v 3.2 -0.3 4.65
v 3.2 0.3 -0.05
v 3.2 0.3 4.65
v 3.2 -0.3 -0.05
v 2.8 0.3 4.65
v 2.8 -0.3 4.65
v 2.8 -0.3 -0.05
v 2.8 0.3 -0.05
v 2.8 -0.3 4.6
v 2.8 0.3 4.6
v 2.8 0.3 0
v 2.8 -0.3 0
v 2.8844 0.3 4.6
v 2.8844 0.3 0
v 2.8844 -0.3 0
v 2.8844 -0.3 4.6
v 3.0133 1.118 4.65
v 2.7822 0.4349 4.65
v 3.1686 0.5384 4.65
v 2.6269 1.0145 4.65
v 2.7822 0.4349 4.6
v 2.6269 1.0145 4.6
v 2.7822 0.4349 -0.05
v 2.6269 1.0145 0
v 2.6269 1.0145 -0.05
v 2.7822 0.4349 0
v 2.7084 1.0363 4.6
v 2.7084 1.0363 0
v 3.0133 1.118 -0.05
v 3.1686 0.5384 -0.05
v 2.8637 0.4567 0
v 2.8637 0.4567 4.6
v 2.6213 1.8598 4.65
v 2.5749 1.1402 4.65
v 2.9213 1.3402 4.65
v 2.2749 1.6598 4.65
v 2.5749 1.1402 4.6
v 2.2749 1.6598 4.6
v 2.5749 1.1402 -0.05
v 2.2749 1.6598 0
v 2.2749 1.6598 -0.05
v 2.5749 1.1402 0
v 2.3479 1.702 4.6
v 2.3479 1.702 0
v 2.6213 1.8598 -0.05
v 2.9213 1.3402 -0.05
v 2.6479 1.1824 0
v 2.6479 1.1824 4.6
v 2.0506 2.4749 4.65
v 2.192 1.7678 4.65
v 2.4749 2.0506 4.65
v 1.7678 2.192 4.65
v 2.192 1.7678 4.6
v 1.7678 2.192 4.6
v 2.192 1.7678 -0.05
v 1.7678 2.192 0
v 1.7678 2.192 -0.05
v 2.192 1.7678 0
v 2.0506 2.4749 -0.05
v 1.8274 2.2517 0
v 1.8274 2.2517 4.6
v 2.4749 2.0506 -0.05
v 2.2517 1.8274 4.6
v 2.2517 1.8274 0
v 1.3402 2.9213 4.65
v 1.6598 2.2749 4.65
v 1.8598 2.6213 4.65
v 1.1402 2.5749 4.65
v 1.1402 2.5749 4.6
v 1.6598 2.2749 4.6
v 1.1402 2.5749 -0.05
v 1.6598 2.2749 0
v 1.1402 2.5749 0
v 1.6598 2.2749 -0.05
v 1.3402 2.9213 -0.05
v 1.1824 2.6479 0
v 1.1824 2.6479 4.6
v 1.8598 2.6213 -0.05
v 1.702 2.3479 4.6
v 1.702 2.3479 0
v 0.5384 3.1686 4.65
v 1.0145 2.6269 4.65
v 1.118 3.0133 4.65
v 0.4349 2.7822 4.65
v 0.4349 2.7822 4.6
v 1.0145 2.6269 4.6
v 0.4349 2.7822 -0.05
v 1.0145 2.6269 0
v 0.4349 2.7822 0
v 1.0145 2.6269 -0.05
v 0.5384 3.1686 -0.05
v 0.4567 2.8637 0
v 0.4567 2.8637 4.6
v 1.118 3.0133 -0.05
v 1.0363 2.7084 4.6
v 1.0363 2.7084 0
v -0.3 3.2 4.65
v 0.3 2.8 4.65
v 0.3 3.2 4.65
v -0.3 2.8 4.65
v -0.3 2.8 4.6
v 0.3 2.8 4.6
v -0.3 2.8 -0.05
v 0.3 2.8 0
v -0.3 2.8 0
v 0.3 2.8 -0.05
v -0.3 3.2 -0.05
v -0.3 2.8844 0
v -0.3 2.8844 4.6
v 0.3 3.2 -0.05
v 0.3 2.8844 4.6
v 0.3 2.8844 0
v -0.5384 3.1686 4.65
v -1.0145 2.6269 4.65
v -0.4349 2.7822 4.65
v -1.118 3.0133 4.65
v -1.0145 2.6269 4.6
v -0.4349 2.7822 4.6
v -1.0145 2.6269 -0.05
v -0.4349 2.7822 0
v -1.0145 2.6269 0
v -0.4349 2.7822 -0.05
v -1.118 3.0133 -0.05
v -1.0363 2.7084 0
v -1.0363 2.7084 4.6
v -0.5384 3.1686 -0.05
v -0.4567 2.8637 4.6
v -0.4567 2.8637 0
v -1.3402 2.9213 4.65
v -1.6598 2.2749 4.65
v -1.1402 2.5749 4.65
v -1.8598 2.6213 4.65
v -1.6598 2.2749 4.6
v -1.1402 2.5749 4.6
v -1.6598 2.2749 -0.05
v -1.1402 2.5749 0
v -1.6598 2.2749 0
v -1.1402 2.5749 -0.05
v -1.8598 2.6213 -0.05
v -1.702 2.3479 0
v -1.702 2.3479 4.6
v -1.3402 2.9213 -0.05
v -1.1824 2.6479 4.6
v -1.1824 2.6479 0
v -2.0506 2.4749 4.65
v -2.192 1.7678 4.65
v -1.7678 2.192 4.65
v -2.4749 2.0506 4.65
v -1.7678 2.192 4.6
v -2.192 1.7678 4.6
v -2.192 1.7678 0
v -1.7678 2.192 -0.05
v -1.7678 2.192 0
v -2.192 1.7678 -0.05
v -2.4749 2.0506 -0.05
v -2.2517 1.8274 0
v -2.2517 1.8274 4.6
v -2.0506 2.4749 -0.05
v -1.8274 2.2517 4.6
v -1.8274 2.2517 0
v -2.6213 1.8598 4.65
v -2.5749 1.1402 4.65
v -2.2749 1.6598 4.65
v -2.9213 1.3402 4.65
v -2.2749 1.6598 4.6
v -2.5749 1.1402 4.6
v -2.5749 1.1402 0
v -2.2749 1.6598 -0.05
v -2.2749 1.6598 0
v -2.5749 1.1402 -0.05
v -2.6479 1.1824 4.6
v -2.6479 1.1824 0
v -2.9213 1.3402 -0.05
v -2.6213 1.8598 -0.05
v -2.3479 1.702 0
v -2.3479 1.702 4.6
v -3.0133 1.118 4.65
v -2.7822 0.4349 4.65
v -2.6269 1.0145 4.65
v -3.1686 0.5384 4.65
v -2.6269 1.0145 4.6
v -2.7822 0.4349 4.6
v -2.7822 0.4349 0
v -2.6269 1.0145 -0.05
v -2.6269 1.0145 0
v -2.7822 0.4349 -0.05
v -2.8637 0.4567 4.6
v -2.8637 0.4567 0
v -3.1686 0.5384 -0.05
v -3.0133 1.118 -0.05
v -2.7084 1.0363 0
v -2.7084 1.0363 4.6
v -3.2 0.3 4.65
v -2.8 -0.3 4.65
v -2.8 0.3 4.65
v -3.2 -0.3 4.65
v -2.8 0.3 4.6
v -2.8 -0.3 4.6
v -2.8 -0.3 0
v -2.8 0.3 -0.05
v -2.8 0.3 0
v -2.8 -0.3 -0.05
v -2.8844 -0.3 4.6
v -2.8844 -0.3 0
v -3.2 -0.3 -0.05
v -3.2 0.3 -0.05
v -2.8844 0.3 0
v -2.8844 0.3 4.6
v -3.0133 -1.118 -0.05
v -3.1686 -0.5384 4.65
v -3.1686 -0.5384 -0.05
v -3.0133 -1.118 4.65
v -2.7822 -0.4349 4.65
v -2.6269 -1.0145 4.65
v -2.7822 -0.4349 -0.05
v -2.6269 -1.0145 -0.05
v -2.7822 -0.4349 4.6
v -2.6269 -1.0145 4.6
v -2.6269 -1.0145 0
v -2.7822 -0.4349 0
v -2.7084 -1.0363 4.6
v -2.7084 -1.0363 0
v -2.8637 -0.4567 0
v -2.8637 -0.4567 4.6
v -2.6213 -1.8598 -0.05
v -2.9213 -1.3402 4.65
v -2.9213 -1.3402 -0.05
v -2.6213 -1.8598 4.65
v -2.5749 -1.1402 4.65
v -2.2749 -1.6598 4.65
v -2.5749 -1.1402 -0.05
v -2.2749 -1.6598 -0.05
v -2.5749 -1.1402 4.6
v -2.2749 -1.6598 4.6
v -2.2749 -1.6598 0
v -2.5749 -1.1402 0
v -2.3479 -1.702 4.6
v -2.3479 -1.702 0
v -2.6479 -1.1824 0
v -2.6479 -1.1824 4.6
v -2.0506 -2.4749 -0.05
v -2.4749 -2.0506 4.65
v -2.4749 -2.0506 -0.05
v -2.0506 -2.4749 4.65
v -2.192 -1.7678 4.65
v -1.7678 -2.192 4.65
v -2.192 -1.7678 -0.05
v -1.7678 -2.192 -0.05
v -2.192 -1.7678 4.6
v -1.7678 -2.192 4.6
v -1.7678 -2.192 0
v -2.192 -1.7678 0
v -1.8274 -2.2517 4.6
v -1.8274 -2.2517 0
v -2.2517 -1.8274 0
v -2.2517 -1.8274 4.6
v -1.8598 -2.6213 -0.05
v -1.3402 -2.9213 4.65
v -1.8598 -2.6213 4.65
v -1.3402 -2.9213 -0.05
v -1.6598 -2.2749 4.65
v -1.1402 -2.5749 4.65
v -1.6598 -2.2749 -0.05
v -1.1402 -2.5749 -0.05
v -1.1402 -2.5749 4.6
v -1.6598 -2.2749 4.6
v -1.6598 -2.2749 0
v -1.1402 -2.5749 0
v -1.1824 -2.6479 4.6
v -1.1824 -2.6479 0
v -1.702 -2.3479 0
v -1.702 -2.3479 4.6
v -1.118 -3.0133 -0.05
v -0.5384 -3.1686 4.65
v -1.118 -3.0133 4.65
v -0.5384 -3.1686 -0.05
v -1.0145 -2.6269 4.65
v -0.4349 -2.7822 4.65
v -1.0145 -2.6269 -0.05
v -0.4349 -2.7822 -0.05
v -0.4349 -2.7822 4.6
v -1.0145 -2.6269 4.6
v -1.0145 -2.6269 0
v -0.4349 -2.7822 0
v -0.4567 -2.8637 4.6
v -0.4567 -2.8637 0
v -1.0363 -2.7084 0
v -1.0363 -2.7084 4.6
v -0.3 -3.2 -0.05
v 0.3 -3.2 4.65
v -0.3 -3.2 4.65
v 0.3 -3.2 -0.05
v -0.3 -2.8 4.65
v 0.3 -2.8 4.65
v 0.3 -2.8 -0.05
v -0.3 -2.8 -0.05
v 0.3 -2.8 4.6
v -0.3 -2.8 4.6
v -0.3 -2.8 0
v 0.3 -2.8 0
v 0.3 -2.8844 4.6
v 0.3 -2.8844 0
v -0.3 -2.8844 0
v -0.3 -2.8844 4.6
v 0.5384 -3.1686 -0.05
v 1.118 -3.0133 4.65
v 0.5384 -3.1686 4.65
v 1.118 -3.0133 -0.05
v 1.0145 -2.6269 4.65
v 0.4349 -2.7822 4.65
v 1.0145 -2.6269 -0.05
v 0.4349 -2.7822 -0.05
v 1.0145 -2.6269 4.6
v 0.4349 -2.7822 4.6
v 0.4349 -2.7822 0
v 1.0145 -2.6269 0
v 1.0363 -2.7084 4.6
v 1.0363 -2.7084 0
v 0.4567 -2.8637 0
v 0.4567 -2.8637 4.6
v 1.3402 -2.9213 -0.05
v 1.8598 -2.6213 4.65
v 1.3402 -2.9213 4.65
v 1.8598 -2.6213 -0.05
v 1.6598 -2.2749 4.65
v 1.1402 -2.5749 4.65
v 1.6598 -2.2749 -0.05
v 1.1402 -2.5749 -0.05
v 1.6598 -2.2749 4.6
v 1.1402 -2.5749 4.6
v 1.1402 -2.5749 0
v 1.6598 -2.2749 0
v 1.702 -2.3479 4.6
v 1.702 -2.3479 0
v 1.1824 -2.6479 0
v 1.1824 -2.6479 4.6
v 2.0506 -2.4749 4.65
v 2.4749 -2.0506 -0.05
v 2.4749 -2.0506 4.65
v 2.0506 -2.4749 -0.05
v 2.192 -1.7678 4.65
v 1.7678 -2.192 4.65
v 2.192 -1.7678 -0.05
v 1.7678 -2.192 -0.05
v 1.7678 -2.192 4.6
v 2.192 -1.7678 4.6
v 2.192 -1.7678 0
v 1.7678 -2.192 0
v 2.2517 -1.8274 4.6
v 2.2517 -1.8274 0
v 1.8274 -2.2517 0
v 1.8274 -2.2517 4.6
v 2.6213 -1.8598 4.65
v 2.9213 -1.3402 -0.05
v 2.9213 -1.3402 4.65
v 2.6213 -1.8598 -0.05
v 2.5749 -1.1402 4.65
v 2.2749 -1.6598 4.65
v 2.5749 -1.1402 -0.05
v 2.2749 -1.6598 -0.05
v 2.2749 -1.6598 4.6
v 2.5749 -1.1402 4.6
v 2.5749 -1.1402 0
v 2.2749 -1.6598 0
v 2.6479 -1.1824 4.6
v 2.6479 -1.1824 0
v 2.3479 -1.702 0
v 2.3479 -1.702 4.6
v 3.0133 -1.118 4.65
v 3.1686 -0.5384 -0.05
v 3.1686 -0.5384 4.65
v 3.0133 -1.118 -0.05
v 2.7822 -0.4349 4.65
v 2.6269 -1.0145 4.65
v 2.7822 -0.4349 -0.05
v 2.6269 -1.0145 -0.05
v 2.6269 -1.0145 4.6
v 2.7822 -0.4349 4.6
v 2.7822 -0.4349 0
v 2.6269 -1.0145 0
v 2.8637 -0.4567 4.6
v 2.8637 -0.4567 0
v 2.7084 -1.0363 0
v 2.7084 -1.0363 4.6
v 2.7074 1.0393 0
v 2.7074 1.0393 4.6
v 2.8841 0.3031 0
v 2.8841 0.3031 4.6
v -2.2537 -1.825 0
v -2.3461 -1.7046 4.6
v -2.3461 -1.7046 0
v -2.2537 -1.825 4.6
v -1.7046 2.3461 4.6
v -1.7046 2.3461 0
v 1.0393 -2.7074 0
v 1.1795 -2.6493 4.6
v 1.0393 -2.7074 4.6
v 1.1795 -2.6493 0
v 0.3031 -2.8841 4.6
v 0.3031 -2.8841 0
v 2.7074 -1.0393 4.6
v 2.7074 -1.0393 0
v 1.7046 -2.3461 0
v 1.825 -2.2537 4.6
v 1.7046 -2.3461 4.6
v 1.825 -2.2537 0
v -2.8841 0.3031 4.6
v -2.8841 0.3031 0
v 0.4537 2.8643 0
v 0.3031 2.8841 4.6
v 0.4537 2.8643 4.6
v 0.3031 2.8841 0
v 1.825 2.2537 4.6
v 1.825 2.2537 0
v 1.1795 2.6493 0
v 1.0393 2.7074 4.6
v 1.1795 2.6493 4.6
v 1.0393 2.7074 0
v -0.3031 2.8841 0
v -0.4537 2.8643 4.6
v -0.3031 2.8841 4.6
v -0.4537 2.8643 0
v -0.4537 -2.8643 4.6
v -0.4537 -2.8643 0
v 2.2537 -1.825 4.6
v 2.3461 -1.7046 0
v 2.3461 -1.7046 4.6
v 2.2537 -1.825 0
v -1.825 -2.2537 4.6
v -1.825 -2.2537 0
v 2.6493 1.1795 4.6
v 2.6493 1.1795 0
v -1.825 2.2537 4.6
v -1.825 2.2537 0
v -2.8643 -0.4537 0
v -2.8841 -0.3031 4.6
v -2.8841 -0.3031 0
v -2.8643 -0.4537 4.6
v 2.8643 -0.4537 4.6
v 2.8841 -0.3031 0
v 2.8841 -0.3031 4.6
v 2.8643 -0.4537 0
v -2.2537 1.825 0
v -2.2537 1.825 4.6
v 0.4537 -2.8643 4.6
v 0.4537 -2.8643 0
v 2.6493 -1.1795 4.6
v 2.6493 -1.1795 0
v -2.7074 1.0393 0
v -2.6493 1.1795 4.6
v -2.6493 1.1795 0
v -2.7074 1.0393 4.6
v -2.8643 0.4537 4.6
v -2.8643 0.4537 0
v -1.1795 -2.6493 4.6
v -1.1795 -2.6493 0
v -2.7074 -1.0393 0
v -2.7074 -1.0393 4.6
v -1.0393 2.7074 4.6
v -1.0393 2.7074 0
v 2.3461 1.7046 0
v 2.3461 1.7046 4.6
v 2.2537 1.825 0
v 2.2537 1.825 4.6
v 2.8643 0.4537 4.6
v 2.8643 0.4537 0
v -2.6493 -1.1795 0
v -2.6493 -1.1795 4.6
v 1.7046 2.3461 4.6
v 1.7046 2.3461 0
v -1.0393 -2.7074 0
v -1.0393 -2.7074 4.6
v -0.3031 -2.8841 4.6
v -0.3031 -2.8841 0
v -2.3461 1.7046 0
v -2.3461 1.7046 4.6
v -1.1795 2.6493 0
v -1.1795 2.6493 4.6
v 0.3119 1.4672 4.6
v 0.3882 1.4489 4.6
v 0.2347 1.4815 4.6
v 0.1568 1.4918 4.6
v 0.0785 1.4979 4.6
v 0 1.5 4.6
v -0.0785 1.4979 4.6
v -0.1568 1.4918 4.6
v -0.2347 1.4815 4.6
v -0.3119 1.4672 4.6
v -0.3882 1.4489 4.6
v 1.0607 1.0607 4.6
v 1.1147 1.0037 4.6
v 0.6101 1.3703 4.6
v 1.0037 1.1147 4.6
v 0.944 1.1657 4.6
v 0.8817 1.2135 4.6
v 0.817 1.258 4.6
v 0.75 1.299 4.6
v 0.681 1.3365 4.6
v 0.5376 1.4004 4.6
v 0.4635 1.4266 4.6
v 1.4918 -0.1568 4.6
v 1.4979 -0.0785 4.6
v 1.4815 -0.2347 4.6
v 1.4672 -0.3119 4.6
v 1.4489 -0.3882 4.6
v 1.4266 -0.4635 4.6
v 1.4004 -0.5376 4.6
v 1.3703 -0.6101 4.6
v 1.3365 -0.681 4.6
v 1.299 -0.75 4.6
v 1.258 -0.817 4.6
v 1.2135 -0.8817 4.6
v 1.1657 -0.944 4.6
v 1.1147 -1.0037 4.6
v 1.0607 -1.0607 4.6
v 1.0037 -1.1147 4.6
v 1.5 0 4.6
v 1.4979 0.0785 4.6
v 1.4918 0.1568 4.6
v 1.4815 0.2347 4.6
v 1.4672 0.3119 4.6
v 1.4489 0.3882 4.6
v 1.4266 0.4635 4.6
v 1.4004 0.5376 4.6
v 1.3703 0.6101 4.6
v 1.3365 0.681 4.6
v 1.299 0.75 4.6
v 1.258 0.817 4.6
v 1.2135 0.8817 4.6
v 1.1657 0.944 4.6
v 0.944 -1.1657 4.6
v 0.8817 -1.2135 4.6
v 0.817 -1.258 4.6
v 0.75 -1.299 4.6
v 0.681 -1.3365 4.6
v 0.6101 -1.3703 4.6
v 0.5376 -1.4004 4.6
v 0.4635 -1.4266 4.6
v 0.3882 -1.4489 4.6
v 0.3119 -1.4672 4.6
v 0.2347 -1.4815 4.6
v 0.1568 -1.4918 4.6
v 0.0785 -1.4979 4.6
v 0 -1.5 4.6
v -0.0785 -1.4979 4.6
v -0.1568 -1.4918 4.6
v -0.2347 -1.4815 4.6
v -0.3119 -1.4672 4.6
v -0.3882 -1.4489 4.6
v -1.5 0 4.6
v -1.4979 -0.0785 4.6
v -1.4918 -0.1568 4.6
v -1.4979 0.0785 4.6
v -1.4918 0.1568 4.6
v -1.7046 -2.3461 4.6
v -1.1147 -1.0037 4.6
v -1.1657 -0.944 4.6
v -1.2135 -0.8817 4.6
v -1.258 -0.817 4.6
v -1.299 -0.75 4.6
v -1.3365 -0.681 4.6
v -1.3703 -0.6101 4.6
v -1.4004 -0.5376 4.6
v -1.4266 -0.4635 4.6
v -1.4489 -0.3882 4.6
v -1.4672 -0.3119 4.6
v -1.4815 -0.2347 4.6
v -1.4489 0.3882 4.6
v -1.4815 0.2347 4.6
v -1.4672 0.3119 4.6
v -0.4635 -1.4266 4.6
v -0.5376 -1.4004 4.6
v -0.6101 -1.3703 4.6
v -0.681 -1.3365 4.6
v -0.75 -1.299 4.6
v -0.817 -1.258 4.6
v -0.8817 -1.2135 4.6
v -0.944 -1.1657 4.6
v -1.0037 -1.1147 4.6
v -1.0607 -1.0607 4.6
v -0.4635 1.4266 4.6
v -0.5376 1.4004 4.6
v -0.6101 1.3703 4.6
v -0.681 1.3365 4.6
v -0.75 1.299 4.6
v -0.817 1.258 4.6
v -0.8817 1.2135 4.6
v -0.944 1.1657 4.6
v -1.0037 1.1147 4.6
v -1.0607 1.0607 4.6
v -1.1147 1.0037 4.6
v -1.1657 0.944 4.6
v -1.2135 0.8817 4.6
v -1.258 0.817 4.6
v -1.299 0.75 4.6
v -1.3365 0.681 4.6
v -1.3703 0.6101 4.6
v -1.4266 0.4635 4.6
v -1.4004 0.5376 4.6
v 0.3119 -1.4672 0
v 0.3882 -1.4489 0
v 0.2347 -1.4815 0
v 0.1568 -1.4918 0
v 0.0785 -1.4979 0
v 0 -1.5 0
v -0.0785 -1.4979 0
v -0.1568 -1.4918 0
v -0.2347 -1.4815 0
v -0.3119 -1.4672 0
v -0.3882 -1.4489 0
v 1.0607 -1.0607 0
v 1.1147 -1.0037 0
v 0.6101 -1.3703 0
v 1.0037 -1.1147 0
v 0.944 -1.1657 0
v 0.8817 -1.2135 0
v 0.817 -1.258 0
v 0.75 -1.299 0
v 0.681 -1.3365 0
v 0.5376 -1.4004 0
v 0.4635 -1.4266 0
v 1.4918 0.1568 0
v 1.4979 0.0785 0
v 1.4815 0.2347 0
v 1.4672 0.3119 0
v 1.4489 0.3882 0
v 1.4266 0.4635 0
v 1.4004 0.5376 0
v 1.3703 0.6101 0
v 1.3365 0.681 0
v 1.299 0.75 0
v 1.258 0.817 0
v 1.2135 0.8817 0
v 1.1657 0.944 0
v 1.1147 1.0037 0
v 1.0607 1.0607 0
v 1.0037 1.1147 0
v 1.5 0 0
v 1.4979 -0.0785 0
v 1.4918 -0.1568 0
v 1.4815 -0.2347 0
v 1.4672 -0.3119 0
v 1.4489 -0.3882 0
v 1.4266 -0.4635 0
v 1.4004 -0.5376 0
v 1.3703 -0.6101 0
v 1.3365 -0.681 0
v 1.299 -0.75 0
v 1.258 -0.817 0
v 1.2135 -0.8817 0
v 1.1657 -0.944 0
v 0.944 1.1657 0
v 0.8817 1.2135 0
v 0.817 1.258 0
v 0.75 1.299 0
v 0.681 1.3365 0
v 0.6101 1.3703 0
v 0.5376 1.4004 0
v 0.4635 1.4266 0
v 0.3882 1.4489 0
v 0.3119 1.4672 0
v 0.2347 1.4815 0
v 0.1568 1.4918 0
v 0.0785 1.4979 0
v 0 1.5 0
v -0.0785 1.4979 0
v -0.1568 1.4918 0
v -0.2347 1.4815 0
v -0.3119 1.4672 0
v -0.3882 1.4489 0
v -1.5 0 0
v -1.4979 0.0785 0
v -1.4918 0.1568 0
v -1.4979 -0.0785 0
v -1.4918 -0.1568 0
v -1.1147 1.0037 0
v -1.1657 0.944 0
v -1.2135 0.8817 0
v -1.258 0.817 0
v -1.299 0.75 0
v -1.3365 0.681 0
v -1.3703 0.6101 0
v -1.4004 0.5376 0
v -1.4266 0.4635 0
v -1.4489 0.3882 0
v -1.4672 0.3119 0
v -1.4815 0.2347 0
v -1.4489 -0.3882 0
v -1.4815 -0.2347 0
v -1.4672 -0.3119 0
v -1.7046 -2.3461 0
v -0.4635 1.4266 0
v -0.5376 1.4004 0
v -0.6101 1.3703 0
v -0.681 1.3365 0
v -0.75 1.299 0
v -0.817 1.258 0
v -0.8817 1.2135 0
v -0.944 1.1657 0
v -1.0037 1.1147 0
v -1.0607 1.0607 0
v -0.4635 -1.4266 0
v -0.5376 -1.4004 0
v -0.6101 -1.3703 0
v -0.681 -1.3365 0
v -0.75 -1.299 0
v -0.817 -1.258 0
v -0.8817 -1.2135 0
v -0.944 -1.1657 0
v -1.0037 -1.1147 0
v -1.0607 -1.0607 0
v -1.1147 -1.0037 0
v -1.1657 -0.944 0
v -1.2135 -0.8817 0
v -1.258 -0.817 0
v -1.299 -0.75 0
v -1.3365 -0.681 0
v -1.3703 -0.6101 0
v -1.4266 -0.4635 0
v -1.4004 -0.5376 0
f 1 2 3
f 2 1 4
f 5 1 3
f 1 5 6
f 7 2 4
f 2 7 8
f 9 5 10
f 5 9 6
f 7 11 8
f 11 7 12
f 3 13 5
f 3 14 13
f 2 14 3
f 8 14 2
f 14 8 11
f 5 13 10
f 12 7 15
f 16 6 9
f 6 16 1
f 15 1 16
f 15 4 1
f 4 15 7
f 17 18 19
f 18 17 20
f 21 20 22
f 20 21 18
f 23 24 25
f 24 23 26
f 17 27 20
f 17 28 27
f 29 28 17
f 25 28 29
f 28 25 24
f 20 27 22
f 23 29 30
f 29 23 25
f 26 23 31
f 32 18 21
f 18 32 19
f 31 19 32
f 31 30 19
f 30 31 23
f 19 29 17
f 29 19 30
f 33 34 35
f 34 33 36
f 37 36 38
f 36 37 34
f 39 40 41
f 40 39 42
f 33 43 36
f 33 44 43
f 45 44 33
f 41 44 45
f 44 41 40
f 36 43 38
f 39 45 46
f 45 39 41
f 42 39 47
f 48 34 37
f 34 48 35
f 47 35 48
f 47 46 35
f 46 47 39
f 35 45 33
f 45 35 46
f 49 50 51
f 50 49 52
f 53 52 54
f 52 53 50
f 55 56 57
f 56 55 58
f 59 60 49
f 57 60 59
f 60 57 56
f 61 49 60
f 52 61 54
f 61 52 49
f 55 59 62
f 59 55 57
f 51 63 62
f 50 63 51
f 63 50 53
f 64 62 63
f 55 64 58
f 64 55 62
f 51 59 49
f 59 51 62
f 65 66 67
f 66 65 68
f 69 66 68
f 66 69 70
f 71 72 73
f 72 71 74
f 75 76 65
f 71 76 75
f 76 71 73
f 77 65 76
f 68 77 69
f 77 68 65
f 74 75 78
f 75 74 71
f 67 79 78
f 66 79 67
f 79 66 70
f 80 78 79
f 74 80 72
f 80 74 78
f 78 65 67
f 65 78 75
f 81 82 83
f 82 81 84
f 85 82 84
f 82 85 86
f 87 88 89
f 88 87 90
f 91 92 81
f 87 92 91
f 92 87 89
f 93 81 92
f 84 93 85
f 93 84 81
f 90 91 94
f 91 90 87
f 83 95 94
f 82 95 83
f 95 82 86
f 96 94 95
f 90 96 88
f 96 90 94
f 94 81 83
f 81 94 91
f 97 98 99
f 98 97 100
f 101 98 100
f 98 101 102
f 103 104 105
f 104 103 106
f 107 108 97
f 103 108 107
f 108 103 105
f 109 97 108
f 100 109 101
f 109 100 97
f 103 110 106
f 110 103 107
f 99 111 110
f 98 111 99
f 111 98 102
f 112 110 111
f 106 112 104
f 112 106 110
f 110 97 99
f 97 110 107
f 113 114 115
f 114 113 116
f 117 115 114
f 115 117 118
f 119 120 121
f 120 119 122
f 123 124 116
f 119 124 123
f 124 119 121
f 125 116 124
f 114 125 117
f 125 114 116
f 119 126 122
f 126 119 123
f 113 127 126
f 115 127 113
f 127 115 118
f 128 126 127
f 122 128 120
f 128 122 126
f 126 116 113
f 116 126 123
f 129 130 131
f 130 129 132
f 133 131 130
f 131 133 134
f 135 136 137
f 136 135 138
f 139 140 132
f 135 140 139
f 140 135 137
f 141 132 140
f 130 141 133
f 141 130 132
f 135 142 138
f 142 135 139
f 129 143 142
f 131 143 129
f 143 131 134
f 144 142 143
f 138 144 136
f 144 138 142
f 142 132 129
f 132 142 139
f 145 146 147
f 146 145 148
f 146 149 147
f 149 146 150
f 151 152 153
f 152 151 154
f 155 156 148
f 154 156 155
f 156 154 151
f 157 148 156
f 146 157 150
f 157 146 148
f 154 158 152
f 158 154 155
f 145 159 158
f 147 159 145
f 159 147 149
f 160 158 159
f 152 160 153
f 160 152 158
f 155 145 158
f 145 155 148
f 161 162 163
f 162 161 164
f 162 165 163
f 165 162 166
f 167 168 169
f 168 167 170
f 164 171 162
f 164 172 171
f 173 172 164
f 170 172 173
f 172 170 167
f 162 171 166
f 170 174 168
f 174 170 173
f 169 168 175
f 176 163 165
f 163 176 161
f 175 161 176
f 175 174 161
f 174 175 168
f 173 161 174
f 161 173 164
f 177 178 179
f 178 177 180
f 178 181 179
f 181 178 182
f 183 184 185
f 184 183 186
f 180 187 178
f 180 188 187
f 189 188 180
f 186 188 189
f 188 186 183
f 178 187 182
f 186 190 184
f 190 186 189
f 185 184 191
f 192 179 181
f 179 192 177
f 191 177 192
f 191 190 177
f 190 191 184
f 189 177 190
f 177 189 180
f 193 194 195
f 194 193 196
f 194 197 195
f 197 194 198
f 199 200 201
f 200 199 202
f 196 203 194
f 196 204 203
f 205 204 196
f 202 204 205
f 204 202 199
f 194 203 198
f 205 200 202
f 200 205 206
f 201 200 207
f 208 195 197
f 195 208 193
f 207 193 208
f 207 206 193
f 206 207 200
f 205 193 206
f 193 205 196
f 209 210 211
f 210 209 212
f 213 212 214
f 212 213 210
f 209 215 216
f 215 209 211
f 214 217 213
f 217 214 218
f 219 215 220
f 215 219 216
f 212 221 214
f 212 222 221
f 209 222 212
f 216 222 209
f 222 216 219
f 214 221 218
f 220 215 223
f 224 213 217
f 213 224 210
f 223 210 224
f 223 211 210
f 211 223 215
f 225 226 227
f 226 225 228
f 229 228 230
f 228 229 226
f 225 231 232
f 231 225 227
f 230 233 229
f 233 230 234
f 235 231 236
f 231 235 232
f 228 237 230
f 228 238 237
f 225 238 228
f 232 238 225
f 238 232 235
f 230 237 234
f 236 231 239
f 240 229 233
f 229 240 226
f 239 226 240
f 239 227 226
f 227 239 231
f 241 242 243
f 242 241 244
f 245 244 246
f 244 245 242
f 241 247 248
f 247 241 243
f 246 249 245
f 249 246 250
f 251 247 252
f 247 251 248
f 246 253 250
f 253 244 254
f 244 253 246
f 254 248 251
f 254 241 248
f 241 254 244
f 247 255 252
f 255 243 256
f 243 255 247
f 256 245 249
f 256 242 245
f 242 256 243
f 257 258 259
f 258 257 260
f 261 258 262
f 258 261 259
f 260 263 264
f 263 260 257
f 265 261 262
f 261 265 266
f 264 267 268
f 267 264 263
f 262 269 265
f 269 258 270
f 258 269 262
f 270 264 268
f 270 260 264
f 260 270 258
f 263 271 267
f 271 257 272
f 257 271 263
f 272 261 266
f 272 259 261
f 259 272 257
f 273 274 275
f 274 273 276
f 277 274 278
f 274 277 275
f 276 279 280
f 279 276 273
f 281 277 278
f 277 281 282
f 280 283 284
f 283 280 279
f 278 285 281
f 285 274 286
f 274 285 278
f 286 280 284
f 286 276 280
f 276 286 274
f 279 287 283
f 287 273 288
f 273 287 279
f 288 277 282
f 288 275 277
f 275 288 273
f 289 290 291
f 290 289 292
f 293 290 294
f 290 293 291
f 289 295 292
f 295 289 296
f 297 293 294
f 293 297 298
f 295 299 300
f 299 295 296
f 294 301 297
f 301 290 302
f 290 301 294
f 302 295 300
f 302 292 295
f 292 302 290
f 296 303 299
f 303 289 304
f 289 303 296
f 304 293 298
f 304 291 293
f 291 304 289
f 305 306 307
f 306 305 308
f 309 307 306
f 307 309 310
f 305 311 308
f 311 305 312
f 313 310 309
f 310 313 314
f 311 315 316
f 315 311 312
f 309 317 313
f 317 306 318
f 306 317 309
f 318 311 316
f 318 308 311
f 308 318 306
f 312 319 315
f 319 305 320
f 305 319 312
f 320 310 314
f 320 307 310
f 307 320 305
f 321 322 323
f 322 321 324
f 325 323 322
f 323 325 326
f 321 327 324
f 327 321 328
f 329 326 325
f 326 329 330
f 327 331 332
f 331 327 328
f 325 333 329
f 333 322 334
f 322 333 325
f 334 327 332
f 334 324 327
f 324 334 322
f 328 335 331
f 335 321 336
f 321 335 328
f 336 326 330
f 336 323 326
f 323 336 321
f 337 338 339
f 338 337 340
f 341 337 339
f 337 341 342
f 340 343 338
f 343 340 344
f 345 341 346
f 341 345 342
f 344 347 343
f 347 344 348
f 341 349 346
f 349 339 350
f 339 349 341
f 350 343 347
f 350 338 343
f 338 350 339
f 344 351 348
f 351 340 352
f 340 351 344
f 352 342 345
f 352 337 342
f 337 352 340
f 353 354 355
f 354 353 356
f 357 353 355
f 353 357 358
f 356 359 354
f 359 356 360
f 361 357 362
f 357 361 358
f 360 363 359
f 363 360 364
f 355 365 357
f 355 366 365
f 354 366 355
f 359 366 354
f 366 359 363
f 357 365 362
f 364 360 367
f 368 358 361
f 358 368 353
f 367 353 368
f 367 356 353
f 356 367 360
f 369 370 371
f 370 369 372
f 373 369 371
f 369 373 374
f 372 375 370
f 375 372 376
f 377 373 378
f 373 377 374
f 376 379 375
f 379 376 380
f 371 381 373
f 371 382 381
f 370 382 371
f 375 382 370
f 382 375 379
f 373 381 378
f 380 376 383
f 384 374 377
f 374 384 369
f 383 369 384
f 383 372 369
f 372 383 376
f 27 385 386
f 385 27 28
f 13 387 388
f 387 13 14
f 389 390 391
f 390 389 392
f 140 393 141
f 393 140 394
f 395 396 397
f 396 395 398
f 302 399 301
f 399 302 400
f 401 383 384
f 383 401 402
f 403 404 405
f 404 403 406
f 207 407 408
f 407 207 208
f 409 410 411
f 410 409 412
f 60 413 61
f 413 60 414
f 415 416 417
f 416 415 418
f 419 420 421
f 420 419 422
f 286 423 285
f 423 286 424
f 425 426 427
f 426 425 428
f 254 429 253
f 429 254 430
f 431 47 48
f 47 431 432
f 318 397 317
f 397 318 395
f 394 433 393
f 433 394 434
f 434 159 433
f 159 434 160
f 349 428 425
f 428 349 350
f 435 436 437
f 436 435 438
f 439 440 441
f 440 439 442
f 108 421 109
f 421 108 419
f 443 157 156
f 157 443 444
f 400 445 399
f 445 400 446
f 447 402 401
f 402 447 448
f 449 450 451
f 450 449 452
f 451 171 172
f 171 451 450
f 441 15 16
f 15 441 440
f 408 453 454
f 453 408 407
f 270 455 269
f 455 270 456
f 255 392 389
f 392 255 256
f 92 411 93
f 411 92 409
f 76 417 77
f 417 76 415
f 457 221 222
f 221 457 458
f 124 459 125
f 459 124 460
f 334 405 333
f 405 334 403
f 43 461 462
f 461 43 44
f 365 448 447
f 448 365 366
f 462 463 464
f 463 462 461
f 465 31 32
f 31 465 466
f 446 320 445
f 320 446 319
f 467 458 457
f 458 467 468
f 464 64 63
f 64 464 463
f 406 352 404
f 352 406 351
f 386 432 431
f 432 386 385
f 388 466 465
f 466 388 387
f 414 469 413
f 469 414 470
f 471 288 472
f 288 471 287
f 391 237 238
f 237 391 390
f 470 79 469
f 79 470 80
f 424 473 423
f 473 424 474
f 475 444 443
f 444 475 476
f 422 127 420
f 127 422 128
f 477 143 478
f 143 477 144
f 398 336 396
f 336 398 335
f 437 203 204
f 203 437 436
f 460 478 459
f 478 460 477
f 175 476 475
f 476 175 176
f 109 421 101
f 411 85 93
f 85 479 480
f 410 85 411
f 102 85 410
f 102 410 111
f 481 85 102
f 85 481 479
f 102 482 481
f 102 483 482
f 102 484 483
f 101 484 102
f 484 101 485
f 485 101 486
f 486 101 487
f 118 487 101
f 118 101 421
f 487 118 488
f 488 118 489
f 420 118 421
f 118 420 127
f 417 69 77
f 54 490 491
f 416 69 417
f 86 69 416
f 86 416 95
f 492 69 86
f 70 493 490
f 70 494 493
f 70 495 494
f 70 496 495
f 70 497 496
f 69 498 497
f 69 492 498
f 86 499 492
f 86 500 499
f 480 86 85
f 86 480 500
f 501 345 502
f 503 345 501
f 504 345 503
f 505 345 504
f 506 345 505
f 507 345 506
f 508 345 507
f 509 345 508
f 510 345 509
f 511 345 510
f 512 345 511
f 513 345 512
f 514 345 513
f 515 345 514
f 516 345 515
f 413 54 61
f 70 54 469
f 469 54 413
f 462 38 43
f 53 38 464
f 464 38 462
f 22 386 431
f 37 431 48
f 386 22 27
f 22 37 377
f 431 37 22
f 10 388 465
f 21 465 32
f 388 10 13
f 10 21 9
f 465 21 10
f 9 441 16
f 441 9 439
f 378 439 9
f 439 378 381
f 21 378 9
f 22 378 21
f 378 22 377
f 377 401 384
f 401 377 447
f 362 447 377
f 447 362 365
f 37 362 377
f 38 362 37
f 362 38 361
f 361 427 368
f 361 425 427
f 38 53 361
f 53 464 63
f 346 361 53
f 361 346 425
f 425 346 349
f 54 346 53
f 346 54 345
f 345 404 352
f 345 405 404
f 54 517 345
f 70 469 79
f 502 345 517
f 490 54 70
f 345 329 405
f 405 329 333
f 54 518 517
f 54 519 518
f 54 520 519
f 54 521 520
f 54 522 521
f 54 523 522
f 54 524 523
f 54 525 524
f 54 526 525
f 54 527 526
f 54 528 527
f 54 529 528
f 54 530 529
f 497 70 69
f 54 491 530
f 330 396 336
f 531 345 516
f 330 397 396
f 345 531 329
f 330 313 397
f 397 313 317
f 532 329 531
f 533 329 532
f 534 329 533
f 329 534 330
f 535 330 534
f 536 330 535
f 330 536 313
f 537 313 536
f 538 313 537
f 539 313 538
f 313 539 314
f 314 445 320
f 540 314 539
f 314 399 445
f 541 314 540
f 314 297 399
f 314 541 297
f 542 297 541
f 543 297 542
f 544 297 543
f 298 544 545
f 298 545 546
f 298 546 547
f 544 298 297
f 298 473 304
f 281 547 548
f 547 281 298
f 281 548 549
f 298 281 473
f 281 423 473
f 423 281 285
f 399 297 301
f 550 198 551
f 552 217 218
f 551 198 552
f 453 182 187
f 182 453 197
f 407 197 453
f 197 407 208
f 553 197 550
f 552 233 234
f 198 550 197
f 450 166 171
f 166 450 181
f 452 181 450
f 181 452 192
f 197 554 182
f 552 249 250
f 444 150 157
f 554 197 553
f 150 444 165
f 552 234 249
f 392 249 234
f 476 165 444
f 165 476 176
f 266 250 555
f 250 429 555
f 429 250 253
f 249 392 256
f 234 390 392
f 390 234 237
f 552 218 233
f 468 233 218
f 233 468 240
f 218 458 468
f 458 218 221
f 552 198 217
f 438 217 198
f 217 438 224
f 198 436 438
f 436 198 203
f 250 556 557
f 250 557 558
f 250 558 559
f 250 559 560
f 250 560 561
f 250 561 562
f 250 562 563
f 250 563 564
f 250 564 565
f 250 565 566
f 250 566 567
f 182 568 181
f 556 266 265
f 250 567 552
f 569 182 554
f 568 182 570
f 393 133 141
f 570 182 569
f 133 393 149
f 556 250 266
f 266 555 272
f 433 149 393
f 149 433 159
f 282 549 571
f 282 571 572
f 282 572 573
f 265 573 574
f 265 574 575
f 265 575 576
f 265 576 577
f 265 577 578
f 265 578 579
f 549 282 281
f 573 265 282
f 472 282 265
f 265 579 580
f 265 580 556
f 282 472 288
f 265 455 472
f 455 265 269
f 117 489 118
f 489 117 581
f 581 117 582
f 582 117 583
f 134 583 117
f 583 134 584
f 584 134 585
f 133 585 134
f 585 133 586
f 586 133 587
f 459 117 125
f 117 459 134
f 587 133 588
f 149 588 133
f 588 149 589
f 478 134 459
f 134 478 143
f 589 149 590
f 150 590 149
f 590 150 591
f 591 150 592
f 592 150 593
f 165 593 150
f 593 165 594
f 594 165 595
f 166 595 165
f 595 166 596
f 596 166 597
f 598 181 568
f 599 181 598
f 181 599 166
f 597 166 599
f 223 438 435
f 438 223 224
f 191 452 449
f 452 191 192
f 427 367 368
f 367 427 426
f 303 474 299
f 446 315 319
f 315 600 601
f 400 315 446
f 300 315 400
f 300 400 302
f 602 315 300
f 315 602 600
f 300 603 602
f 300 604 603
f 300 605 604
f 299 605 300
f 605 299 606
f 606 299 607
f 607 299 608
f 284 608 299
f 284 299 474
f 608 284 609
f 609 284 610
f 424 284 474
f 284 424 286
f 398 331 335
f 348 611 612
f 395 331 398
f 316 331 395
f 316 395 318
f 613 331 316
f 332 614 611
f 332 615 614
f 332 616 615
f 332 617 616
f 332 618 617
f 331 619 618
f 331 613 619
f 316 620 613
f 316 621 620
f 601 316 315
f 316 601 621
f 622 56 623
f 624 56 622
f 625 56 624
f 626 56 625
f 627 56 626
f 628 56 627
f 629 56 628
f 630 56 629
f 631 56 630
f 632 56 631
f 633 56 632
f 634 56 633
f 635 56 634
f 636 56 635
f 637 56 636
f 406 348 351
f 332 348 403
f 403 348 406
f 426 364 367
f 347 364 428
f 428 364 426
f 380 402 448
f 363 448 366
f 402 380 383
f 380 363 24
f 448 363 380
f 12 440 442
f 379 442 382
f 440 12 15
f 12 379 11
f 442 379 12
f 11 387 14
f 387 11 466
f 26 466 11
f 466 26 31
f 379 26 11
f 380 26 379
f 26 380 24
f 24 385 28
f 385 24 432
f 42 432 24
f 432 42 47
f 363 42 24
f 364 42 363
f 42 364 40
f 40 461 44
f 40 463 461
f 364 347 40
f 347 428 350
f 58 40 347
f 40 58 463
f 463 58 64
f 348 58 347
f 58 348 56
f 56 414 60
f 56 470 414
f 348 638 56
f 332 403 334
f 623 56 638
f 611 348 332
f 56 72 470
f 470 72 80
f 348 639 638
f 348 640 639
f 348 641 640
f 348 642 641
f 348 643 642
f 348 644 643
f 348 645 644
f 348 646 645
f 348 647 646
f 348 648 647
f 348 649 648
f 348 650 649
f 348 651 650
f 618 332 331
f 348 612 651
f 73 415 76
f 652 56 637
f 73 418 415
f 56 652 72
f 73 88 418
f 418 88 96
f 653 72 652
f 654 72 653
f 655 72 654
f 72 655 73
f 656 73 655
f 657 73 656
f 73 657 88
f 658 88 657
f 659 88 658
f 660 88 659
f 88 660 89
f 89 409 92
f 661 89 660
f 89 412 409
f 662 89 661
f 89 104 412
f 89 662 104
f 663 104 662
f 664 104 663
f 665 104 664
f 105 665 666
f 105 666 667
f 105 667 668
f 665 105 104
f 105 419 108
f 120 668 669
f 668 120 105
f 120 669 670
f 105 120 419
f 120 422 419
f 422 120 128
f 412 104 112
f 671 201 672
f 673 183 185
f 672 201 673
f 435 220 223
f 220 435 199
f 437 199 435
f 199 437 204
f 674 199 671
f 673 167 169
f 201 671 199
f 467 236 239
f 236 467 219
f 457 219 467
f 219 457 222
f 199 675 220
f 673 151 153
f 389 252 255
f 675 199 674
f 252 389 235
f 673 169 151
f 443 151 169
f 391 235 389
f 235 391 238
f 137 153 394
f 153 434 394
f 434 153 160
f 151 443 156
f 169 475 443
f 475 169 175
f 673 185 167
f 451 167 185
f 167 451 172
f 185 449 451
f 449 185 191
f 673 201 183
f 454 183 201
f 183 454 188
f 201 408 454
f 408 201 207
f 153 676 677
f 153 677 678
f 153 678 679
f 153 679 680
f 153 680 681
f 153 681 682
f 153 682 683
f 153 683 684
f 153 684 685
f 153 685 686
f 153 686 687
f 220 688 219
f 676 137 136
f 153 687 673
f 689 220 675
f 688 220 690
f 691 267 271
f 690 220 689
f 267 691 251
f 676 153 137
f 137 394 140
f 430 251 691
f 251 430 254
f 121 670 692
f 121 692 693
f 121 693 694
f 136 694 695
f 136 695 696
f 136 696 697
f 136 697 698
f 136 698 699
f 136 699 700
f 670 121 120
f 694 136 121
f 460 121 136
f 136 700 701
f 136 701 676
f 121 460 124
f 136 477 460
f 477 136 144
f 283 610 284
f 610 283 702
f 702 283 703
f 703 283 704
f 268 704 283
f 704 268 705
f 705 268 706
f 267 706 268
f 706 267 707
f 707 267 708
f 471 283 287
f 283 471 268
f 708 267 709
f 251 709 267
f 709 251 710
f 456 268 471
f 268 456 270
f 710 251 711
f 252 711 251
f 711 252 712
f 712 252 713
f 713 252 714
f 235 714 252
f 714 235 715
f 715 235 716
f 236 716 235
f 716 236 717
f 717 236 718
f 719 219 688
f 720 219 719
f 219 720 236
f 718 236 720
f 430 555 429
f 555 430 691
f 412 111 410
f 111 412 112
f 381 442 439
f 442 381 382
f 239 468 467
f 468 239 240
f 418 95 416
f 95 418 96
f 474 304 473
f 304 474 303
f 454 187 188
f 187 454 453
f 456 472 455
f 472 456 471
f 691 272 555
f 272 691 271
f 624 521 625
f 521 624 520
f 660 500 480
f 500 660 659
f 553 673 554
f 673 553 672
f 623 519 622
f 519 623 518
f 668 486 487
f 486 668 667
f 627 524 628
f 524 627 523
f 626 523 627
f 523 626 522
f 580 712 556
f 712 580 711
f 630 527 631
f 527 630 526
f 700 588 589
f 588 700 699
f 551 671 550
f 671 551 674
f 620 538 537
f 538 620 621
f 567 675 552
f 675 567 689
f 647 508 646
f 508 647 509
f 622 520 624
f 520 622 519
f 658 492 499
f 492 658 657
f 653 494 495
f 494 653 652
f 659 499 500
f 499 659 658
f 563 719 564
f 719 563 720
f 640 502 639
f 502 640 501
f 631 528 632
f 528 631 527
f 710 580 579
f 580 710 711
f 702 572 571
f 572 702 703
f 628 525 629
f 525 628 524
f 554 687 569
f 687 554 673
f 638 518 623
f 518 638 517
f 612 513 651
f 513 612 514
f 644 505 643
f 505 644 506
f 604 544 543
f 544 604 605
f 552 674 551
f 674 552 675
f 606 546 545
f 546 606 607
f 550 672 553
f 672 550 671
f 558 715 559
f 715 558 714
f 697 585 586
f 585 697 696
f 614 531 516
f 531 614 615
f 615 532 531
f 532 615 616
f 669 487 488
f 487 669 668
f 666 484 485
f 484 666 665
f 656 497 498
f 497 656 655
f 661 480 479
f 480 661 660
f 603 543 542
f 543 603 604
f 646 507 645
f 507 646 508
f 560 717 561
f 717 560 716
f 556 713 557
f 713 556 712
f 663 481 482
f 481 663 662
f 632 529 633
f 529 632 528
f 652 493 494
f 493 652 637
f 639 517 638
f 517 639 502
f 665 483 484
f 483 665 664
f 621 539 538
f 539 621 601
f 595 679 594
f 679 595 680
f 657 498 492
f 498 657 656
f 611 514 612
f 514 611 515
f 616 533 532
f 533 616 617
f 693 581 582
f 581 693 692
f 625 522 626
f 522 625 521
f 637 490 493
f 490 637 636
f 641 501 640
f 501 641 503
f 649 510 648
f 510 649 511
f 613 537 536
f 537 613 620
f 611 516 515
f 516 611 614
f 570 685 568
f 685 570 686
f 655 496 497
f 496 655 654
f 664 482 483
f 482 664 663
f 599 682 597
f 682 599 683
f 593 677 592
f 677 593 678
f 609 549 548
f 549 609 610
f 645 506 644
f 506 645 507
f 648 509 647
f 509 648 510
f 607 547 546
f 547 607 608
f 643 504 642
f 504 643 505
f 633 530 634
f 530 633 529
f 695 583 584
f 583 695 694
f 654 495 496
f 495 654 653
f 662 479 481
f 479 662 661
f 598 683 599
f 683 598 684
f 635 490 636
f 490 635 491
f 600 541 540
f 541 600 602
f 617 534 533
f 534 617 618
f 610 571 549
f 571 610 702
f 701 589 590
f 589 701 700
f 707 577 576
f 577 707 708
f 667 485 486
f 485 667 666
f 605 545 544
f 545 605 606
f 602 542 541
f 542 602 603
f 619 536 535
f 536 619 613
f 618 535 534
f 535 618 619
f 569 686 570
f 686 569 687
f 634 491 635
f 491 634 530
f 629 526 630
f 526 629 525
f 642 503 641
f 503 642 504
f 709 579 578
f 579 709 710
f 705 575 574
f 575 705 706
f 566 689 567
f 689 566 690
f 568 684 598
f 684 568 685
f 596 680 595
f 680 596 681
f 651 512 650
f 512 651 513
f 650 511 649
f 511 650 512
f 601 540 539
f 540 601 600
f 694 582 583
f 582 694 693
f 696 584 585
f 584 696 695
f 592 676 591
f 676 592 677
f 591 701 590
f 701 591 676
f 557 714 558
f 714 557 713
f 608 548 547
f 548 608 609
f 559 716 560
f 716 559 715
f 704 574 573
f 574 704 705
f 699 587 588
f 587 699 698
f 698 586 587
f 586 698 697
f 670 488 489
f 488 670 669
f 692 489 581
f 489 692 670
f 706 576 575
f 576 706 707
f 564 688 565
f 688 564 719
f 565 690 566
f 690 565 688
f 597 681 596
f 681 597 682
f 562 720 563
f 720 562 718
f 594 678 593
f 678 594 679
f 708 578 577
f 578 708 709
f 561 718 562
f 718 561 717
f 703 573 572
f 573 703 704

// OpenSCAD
// Threaded heat-set insert (simplified solid model)
// Target: 5.8mm OD, 4.6mm long, for 3.0mm screws (modeled as straight bore)

outer_diameter   = 5.8;   // mm
length           = 4.6;   // mm
thread_diameter  = 3.0;   // mm (modeled as straight bore)
knurl_depth      = 0.3;   // mm (radial protrusion)
knurl_width      = 0.6;   // mm (tangential width)
knurl_count      = 24;    // ribs around circumference
chamfer_height   = 0.5;   // mm
overlap          = 0.05;  // mm (ensures watertight unions/differences)
$fn = 120;

module outer_shell_with_ribs() {
    union() {
        // Main cylindrical body
        cylinder(d=outer_diameter, h=length, center=false);

        // Retention ribs: protrude outward and overlap into body for connectivity
        // Place ribs centered in Z, and radially so inner face overlaps into the cylinder.
        for (i = [0 : knurl_count-1]) {
            rotate([0, 0, i * 360/knurl_count])
                translate([outer_diameter/2 + knurl_depth/2 - overlap, 0, length/2])
                    cube([knurl_depth + 2*overlap, knurl_width, length + 2*overlap], center=true);
        }
    }
}

module lead_in_chamfer_outer() {
    // Outer chamfer on top end; overlaps slightly into body
    translate([0, 0, length - chamfer_height - overlap])
        cylinder(d1=outer_diameter, d2=outer_diameter - 2*chamfer_height, h=chamfer_height + overlap, center=false);
}

module threaded_insert() {
    difference() {
        union() {
            outer_shell_with_ribs();
            lead_in_chamfer_outer();
        }

        // Internal bore (modeled as straight hole), extended beyond ends to guarantee cut
        translate([0, 0, -overlap])
            cylinder(d=thread_diameter, h=length + 2*overlap, center=false);
    }
}

threaded_insert();
